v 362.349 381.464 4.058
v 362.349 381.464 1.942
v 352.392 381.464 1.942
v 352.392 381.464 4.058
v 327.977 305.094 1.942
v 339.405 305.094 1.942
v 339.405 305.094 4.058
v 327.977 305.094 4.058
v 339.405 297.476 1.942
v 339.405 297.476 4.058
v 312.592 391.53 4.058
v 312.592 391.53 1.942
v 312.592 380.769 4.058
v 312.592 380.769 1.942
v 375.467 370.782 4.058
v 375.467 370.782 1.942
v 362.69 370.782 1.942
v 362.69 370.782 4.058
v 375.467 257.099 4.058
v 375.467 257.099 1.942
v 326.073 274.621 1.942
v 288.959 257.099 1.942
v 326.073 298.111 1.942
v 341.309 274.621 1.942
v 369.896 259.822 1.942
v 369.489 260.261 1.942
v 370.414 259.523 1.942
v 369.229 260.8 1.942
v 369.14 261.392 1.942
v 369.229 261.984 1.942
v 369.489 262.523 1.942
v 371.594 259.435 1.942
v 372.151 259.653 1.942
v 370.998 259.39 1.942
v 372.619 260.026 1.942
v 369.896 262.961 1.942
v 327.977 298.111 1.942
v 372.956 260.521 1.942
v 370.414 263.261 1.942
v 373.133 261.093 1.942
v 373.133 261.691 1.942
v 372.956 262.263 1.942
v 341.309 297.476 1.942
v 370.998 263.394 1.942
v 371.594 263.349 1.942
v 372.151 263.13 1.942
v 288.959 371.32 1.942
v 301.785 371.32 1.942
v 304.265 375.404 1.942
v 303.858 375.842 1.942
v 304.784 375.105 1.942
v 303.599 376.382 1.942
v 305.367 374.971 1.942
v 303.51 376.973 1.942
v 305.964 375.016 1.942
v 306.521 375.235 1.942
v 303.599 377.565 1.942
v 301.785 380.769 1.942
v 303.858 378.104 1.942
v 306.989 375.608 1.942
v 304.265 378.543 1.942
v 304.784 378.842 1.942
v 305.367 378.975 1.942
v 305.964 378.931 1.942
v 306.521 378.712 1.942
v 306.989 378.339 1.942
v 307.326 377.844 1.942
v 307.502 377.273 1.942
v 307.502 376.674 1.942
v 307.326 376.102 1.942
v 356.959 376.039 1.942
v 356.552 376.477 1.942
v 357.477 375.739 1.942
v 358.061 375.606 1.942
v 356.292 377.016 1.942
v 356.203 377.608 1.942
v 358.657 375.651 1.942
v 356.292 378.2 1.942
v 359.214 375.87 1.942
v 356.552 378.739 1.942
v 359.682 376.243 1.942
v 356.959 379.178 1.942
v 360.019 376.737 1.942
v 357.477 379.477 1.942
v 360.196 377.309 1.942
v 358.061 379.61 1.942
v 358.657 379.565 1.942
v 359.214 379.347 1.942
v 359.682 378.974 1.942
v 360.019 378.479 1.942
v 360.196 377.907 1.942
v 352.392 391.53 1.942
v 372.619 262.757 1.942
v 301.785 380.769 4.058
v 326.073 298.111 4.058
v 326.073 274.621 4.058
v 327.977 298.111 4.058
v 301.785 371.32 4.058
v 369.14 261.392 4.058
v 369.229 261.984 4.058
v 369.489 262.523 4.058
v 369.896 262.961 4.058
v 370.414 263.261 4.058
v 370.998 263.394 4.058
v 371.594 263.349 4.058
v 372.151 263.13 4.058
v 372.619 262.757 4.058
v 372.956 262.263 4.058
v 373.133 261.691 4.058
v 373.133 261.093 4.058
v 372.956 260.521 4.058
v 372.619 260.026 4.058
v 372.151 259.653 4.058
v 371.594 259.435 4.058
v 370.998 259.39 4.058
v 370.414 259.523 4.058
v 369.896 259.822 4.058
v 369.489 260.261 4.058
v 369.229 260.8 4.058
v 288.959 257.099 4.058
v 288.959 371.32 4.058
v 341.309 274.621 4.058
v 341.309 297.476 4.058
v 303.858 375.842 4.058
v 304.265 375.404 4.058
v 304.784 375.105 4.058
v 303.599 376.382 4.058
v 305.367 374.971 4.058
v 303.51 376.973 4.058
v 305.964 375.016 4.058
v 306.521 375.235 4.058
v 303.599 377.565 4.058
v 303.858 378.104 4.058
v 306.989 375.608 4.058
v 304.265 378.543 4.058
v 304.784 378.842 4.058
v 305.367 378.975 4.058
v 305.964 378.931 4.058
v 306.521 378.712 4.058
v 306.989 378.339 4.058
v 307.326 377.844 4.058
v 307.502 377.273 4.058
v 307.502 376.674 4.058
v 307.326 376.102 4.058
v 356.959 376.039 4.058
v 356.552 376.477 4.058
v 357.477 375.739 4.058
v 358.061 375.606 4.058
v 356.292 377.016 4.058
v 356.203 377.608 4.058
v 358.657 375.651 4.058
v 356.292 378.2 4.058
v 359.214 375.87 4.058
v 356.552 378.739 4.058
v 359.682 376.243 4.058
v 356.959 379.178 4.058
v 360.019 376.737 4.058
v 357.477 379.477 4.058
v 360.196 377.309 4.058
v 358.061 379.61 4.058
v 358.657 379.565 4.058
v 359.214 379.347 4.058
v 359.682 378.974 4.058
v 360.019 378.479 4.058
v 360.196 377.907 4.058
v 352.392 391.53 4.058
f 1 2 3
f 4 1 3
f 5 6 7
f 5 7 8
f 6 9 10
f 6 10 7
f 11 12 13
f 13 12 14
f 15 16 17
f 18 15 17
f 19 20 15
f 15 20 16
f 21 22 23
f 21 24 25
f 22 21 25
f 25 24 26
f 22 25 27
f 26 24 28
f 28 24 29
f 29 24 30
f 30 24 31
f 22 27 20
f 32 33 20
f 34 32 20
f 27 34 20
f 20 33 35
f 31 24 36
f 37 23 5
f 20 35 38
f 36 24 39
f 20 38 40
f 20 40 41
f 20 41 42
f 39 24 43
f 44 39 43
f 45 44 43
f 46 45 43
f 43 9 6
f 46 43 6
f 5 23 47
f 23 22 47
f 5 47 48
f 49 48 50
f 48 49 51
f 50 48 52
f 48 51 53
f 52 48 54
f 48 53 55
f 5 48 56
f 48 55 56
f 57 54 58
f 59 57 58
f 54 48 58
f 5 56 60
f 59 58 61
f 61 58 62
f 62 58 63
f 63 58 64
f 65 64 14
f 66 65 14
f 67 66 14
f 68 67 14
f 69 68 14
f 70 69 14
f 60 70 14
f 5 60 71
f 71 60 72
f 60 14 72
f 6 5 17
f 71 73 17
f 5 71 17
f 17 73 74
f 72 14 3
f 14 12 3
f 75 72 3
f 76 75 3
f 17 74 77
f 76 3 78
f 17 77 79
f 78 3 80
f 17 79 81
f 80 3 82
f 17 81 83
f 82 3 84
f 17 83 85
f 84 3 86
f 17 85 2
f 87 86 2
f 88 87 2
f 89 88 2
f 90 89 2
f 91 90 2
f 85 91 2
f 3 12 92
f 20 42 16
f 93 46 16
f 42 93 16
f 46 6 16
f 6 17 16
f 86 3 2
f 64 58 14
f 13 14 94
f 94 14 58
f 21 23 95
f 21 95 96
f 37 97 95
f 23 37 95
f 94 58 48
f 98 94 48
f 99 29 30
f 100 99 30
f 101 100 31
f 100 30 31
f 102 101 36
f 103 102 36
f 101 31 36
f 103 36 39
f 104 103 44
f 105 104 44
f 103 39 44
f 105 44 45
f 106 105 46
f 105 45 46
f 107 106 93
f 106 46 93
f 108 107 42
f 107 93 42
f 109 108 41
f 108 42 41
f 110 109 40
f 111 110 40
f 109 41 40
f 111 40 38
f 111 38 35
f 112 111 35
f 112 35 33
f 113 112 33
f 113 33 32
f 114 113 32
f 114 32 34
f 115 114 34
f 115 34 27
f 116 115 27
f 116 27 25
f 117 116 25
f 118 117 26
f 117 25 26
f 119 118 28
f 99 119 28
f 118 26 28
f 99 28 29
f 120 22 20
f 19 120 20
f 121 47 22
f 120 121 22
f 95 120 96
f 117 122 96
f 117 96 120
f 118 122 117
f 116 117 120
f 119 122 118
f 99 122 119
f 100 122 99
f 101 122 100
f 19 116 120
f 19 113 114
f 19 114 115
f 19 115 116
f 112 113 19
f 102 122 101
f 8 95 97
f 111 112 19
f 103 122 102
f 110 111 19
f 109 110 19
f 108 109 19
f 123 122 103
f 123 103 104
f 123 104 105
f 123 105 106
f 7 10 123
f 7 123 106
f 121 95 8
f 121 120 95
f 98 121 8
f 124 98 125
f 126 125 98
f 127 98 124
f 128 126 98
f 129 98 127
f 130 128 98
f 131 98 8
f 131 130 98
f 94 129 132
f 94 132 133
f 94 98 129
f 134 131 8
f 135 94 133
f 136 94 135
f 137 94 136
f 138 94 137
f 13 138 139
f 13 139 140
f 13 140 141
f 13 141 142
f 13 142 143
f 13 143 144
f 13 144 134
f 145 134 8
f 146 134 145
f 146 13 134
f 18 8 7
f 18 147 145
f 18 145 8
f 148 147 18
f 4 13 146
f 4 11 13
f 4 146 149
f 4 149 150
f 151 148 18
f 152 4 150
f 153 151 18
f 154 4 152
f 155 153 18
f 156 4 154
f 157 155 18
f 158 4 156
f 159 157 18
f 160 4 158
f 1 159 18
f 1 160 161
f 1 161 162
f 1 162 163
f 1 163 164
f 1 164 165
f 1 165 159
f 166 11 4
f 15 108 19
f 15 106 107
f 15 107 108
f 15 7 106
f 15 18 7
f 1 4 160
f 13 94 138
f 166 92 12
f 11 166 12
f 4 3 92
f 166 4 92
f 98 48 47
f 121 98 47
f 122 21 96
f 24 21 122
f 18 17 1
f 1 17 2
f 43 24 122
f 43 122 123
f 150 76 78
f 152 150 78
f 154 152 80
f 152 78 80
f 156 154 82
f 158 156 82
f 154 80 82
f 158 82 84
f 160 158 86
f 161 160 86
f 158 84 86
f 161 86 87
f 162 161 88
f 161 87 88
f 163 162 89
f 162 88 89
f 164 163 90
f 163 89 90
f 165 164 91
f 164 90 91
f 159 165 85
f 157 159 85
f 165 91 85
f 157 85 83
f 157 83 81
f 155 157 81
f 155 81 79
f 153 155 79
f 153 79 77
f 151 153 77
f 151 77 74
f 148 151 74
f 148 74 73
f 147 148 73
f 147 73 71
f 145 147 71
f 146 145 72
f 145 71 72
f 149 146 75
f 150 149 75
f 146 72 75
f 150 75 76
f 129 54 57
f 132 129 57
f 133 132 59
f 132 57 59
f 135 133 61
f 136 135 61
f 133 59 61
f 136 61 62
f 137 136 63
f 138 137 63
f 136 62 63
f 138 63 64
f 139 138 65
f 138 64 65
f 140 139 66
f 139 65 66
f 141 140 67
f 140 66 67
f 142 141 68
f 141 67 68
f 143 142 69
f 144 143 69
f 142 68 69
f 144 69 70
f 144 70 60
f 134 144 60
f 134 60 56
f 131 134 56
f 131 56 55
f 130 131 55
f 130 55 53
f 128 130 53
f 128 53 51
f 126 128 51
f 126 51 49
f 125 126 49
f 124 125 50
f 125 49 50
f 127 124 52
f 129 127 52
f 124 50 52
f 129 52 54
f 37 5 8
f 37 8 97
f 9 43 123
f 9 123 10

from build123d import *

# Parameters (mm, degrees)
BOSS_EXTRUDE1_DEPTH = 6
SKETCH9_R           = 5.691956205
SKETCH9_R_2         = 5.691972425
SKETCH9_R_3         = 5.691961612
CUT_EXTRUDE1_DEPTH  = 6
SCALE2_SCALE        = 0.3527


with BuildPart() as part:
    # Sketch8 → Boss-Extrude1 (new body)
    with BuildSketch(Plane.XY):
        Polygon((455.046069669, 138.815328461), (455.046069669, 461.140101754), (418.818767583, 461.140101754), (417.854464359, 491.424711157), (389.623159284, 491.424711157), (389.623159284, 519.966114473), (276.778792345, 519.966114473), (276.778792345, 489.453304052), (246.138948372, 489.453304052), (246.138948372, 462.665142262), (209.772989289, 462.665142262), (209.772989289, 138.815328461), align=None)
        Polygon((352.800007218, 274.896015056), (320.400005452, 274.896015056), (320.400005452, 255.096012775), (315.000008762, 255.096012775), (315.000008762, 188.496024764), (358.200003908, 188.496024764), (358.200003908, 253.29600667), (352.800007218, 253.29600667), align=None, mode=Mode.SUBTRACT)
    extrude(amount=BOSS_EXTRUDE1_DEPTH)

    # Sketch9 → Cut-Extrude1 (cut)
    with BuildSketch(Plane(origin=(0, 0, 0), x_dir=(-1, 0, 0), z_dir=(0, 0, -1))):
        with Locations((-442.800031348, 150.987964196)):
            Circle(SKETCH9_R)
        with Locations((-256.719699101, 478.692872416)):
            Circle(SKETCH9_R_2)
        with Locations((-406.119708447, 480.492867708)):
            Circle(SKETCH9_R_3)
    extrude(amount=-CUT_EXTRUDE1_DEPTH, mode=Mode.SUBTRACT)


with BuildPart() as part_1:
    # Scale2: scaled about (332.105882885, 321.548539841, 3)
    add(part.part.scale(SCALE2_SCALE).moved(Location((214.972137991, 208.138369839, 1.9419))))


solid = part_1.part
